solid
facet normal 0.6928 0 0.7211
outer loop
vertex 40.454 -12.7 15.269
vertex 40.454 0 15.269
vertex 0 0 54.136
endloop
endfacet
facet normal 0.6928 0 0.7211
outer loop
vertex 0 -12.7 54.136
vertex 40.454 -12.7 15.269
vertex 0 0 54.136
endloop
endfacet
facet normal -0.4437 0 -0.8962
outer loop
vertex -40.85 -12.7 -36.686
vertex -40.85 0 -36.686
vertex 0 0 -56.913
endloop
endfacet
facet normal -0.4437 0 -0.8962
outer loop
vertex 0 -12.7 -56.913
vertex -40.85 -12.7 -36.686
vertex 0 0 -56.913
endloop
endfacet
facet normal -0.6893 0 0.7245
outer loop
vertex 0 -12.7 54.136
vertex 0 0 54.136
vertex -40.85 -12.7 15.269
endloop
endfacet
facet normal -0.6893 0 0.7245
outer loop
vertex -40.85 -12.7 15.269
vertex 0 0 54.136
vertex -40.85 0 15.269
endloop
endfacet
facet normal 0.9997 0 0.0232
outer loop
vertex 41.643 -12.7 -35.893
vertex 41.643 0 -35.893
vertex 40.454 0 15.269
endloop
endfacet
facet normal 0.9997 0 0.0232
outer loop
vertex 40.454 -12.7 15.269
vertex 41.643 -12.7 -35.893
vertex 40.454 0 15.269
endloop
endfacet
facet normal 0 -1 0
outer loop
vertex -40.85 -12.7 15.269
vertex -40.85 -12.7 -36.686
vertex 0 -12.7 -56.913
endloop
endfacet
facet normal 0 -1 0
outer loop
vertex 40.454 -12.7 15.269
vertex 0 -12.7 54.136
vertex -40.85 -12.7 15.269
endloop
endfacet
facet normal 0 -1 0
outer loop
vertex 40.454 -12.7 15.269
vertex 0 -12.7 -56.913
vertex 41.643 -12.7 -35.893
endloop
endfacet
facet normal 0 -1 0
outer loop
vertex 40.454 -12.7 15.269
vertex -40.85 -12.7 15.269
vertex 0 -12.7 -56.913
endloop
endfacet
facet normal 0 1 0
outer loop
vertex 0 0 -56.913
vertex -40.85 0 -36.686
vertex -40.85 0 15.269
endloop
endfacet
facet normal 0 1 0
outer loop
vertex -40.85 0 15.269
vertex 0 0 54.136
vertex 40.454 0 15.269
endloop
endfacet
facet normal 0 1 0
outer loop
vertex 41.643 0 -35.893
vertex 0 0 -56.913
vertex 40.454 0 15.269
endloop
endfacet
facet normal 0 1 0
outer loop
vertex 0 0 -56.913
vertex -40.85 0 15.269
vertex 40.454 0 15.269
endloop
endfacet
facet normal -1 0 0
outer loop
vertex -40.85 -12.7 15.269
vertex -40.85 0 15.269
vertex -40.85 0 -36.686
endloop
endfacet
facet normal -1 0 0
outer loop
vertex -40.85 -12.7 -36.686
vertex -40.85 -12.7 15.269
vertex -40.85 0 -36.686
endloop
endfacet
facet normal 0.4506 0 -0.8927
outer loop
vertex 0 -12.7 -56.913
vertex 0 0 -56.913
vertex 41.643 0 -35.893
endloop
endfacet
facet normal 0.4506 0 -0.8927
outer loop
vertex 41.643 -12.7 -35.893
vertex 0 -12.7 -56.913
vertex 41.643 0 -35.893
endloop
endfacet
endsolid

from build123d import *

# Parameters (mm, degrees)
F1_DEPTH = 12.7


with BuildPart() as f1:
    # F0 (on Front) → F1 (new body)
    with BuildSketch(Plane.XZ):
        Polygon((40.453546, 15.269228), (0, 54.136354), (-40.85014, 15.269228), align=None)
        Polygon((40.453546, 15.269228), (-40.85014, 15.269228), (-40.85014, -36.685806), (0, -56.912575), (41.643355, -35.892602), align=None)
    extrude(amount=F1_DEPTH)


solid = f1.part
